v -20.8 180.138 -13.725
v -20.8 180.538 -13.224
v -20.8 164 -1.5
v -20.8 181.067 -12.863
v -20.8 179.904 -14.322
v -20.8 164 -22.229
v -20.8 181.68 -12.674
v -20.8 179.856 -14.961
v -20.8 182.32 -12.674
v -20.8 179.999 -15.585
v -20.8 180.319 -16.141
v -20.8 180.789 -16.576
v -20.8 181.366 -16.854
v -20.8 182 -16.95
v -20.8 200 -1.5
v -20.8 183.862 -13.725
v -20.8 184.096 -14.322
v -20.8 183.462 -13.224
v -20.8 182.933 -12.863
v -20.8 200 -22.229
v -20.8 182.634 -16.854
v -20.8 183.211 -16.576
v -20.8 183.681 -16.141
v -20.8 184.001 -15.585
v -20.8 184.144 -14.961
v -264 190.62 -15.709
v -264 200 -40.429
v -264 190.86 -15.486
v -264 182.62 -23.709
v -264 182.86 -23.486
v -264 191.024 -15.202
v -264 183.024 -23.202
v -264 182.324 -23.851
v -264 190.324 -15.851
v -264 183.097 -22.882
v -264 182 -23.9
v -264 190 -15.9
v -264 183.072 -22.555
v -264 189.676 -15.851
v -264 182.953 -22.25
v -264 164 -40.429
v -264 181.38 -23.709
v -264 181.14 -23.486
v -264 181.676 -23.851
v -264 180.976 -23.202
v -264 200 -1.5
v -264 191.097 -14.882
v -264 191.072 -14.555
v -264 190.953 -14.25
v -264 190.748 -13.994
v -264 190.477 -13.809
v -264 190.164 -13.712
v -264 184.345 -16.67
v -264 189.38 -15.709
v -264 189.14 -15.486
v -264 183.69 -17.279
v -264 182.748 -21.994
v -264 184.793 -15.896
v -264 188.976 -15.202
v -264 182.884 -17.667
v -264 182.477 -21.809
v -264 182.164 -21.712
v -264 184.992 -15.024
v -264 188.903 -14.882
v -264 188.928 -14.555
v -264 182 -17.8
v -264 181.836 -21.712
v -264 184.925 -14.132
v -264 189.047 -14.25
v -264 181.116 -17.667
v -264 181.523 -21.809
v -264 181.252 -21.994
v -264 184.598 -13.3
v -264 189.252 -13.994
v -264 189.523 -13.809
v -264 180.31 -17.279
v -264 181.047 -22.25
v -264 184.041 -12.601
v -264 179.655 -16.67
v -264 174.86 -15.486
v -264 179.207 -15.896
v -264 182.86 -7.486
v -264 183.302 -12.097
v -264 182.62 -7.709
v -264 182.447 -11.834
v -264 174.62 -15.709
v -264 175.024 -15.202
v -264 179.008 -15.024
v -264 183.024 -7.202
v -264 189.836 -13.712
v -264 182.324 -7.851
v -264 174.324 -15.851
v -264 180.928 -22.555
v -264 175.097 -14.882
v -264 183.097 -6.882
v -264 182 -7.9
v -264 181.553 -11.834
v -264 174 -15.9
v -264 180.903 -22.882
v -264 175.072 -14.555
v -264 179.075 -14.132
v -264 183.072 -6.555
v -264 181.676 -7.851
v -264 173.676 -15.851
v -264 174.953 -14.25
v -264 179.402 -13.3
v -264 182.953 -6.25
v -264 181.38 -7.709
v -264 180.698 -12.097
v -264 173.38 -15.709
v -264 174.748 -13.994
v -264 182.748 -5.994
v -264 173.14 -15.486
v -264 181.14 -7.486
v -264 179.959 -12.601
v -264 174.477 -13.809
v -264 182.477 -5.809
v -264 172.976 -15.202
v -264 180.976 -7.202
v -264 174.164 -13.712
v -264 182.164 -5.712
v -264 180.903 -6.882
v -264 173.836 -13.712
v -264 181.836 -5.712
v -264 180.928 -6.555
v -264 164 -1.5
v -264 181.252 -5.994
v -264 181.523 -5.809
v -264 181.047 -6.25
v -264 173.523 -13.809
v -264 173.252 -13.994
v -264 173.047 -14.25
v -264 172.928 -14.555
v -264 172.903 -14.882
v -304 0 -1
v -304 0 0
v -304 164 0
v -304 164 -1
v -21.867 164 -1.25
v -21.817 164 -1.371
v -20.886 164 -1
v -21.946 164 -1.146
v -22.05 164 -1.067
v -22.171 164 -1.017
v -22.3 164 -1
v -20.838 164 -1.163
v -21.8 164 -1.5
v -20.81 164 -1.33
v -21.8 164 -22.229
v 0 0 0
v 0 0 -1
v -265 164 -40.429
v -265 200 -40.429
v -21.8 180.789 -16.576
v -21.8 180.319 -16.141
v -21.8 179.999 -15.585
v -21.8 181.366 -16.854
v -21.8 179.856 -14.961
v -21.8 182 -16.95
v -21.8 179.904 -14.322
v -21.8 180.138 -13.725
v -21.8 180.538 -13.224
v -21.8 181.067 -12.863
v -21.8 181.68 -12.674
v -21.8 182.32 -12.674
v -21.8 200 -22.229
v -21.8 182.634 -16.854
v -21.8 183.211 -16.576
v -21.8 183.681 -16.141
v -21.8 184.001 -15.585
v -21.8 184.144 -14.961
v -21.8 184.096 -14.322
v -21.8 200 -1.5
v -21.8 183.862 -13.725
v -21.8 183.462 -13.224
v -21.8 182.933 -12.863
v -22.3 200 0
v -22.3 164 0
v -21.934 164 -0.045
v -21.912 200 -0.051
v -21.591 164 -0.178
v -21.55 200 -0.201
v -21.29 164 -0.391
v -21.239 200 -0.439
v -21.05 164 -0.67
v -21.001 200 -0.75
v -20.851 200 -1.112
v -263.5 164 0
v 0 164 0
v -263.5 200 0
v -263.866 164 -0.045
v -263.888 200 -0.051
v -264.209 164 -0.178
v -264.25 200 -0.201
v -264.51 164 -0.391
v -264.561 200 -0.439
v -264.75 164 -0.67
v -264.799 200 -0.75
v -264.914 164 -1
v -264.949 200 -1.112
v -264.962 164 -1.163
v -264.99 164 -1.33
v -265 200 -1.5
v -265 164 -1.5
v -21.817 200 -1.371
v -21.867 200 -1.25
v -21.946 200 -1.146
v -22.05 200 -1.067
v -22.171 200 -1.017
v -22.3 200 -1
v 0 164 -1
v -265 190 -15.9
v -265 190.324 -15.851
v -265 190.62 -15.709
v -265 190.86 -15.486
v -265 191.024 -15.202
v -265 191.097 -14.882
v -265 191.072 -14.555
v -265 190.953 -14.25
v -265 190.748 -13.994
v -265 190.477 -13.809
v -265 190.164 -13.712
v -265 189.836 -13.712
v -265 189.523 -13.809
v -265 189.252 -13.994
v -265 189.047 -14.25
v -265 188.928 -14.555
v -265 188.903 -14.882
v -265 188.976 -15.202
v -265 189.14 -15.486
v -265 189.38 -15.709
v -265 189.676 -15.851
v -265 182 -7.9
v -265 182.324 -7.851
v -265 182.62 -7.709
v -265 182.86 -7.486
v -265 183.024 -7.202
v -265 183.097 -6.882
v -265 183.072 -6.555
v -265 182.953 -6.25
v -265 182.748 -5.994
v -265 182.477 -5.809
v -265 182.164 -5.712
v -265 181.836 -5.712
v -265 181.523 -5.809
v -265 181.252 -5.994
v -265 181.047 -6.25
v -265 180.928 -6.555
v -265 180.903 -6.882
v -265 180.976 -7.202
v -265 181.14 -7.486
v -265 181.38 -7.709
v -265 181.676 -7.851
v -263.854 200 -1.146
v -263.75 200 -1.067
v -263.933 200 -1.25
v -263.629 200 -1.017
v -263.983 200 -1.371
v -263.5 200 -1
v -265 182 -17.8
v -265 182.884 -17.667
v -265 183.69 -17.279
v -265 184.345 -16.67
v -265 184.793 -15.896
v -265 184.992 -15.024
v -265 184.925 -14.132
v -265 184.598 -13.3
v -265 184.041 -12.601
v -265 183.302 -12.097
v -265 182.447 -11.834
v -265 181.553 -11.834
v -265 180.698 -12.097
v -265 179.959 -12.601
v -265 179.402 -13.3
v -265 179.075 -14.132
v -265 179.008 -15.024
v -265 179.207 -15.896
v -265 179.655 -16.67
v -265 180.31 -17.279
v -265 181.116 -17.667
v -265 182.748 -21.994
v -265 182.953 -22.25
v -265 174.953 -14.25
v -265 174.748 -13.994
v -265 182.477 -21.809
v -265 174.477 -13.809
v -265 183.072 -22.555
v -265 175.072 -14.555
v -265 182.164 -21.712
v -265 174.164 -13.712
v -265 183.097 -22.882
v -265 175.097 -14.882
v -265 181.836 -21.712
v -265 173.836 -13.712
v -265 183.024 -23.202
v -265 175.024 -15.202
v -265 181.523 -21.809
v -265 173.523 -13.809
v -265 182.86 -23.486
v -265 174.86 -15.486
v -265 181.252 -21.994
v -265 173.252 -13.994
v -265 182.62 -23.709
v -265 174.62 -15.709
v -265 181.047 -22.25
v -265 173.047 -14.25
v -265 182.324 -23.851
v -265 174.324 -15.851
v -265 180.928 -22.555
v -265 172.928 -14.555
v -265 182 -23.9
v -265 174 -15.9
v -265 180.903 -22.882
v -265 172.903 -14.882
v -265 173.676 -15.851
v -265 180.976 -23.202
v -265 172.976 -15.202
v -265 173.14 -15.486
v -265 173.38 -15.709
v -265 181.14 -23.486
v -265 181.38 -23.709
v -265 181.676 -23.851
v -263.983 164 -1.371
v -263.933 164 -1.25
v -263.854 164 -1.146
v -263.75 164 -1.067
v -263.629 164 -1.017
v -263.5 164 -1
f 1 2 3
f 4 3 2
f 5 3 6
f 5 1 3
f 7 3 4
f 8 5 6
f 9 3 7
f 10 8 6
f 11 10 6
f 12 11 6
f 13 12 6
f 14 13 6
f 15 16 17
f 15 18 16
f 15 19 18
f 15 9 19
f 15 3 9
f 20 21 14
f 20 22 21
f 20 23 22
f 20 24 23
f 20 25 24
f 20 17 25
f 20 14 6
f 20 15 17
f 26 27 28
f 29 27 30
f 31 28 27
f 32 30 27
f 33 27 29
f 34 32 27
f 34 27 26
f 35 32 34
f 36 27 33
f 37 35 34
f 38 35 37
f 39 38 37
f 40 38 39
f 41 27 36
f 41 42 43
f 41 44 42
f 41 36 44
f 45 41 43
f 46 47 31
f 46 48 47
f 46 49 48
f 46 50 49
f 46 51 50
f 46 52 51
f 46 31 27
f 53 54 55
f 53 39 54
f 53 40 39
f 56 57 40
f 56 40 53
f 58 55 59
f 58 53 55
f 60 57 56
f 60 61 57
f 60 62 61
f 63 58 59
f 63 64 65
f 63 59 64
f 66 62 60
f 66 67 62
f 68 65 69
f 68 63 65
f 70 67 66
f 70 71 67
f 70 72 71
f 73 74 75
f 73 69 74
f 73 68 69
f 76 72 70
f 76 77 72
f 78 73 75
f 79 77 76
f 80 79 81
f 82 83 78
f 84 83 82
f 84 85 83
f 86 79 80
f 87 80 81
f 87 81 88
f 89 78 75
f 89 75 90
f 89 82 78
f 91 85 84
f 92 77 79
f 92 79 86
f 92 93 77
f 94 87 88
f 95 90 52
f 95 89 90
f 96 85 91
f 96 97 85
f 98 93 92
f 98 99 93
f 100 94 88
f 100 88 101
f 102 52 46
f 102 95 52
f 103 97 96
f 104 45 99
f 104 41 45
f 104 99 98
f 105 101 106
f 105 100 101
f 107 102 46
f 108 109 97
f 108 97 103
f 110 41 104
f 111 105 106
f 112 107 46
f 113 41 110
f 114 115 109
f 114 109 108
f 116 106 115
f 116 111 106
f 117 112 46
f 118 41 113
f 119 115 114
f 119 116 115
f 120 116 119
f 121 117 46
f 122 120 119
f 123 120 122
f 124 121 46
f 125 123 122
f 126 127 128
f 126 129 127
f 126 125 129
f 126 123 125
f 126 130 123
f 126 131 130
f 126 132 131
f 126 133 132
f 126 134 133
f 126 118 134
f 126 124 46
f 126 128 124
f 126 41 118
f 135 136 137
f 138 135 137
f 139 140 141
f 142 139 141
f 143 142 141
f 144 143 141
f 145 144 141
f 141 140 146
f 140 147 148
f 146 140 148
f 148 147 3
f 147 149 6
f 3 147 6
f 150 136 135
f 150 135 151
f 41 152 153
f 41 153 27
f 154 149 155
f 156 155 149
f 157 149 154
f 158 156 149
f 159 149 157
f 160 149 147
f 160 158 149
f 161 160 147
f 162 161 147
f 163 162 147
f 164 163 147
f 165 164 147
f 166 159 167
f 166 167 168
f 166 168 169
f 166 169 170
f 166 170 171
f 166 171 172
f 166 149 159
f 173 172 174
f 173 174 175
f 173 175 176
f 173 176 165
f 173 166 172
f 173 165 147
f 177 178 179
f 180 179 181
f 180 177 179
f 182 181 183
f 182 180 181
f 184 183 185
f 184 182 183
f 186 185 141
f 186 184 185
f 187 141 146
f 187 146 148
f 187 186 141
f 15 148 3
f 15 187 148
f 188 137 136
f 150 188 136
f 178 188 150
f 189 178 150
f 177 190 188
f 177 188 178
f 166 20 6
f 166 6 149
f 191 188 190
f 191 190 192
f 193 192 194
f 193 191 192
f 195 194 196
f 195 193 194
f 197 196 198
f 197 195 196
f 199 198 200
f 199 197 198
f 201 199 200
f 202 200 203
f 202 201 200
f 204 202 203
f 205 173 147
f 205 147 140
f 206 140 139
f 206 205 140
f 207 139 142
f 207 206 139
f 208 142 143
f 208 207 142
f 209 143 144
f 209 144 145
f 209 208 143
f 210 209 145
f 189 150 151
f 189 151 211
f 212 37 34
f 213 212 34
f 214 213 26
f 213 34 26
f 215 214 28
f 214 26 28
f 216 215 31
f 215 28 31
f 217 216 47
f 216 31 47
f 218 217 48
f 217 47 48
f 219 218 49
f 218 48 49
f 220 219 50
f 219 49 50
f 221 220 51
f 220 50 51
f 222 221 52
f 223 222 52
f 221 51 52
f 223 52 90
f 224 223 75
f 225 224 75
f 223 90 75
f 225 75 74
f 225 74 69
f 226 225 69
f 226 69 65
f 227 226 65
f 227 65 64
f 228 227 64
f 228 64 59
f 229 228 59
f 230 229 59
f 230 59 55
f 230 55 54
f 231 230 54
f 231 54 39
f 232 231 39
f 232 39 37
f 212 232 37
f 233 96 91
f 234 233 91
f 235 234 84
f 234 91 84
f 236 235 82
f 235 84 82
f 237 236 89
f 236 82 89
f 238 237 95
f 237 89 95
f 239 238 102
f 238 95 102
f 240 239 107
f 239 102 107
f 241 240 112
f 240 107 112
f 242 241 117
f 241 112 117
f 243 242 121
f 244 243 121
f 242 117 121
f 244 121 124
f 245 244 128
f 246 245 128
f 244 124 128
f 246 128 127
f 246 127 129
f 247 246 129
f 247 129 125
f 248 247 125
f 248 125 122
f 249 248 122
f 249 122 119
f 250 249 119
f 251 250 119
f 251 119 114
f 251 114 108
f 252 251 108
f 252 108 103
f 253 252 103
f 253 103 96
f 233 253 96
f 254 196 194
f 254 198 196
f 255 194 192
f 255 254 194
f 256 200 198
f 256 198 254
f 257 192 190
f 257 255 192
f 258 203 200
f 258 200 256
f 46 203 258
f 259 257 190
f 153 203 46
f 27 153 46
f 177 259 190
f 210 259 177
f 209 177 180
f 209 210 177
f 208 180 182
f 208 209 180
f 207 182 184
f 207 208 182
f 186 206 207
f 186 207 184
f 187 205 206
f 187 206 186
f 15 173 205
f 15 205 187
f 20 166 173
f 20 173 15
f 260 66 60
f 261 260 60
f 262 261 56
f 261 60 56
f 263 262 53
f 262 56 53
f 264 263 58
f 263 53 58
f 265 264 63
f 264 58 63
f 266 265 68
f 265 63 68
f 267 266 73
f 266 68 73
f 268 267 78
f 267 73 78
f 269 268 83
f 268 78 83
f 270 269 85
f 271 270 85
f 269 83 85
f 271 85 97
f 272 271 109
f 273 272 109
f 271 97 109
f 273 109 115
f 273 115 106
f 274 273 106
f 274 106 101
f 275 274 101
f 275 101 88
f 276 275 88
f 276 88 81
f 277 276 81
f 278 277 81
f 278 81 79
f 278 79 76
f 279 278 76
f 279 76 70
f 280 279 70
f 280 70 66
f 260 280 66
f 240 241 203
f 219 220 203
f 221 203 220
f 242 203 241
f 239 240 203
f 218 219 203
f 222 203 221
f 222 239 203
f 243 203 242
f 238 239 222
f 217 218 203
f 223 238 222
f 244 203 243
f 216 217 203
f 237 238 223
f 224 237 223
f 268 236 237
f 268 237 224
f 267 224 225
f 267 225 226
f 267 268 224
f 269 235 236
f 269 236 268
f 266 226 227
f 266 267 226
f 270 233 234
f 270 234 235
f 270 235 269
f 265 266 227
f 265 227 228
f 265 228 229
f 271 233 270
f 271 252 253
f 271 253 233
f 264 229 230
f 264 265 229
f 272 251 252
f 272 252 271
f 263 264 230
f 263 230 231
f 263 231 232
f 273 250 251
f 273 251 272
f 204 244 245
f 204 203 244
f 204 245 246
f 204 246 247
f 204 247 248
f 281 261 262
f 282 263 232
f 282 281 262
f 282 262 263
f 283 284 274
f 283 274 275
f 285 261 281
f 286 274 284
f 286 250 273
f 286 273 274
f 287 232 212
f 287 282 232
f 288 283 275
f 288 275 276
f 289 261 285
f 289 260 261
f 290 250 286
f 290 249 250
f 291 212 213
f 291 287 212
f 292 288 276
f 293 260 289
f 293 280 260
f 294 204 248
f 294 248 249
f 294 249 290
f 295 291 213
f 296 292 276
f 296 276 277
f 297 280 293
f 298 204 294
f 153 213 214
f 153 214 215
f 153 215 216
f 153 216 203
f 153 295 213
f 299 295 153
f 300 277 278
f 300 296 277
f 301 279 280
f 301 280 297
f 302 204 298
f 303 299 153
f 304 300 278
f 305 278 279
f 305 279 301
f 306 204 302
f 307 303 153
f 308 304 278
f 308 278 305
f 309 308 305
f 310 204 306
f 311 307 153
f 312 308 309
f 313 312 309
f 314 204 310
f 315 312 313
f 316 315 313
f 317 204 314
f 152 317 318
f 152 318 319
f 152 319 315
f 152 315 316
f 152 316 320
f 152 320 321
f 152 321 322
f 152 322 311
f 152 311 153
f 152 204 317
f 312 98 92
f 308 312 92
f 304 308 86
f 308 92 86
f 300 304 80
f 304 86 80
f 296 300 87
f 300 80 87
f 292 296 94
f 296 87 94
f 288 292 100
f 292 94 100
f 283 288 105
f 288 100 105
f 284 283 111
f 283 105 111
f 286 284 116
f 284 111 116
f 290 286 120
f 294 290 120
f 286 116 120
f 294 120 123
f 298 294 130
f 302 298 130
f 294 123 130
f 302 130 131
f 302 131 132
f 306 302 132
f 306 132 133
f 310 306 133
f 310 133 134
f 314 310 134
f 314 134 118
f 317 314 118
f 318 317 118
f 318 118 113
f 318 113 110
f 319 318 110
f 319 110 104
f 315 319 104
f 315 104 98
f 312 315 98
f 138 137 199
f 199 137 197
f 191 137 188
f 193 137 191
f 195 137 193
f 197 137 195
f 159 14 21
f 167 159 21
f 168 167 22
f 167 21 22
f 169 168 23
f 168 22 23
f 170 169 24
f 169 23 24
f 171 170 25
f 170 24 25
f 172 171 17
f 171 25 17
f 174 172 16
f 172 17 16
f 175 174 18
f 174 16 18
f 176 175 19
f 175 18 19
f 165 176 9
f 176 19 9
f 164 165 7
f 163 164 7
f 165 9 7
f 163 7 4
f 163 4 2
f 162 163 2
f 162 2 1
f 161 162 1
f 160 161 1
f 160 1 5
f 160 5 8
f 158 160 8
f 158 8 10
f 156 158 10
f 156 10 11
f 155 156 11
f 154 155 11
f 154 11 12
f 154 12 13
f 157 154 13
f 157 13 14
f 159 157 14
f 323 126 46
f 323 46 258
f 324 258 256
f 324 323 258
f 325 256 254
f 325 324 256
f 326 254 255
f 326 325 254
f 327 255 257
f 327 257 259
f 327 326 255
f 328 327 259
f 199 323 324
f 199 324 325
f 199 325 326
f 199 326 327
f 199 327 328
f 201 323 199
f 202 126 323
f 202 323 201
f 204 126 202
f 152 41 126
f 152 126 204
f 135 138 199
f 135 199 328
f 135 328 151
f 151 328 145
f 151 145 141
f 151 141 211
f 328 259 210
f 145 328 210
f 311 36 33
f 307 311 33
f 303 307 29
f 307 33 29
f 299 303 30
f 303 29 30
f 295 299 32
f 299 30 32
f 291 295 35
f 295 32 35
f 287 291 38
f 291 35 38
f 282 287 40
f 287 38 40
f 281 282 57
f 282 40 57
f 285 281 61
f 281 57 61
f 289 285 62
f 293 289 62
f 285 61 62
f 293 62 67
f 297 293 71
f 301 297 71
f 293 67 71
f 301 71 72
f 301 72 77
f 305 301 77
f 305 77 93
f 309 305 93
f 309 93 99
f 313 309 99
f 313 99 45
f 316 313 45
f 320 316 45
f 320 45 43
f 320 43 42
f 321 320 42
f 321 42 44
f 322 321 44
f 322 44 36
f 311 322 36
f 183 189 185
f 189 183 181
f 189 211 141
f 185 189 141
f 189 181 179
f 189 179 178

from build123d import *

# Parameters (mm, degrees)
SKETCH1_W                    = 304
SKETCH1_H                    = 200
BASE_FLANGE1_DEPTH           = 1
SKETCH2_W                    = 39
SKETCH2_H                    = 36
CUT_EXTRUDE1_DEPTH           = 10
EDGE_FLANGE1_STRIP_W         = 5
EDGE_FLANGE1_STRIP_H         = 1
EDGE_FLANGE1_STRIP_CUT_DEPTH = 36
EDGE_FLANGE1_DEPTH           = 36
SKETCH9_R                    = 1.1
SKETCH9_R_2                  = 3
CUT_EXTRUDE2_DEPTH           = 10
CUT_EXTRUDE4_REACH           = 368.129
SKETCH18_W                   = 20.8
SKETCH18_H                   = 36
EDGE_FLANGE2_STRIP_W         = 5
EDGE_FLANGE2_STRIP_H         = 1
EDGE_FLANGE2_STRIP_CUT_DEPTH = 36
EDGE_FLANGE2_DEPTH           = 36
M4_CLEARANCE_HOLE2_D         = 4.3


# Sheet-metal steps are written as plain solids
with BuildPart() as part:
    # Sketch1 → Base-Flange1 (new body)
    with BuildSketch(Plane.XY):
        with Locations((-152, 100)):
            Rectangle(SKETCH1_W, SKETCH1_H)
    extrude(amount=-BASE_FLANGE1_DEPTH)

    # Sketch2 → Cut-Extrude1 (cut)
    with BuildSketch(Plane.XY):
        with Locations((-284.5, 182)):
            Rectangle(SKETCH2_W, SKETCH2_H)
    extrude(amount=-CUT_EXTRUDE1_DEPTH, mode=Mode.SUBTRACT)

    # Edge-Flange1 strip (across the edge) → Edge-Flange1 strip cut (cut)
    with BuildSketch(Plane(origin=(-265, 164, -1), x_dir=(1, 0, 0), z_dir=(0, 1, 0))):
        with Locations((-1, -0.5)):
            Rectangle(EDGE_FLANGE1_STRIP_W, EDGE_FLANGE1_STRIP_H)
    extrude(amount=EDGE_FLANGE1_STRIP_CUT_DEPTH, mode=Mode.SUBTRACT)

    # Edge-Flange1 section (across the edge) → Edge-Flange1 (add)
    with BuildSketch(Plane(origin=(-265, 164, -1), x_dir=(1, 0, 0), z_dir=(0, 1, 0))):
        with BuildLine():
            Line((0, 0.5), (0, 39.429))
            Line((0, 39.429), (1, 39.429))
            Line((1, 39.429), (1, 0.5))
            ThreePointArc((1, 0.5), (1.146446609, 0.146446609), (1.5, 0))
            Line((1.5, 0), (1.5, -1))
            ThreePointArc((1.5, -1), (0.439339828, -0.560660172), (0, 0.5))
        make_face()
    extrude(amount=EDGE_FLANGE1_DEPTH)

    # Sketch9 → Cut-Extrude2 (cut)
    with BuildSketch(Plane(origin=(-264, 0, 0), x_dir=(0, 0, -1), z_dir=(1, 0, 0))):
        with Locations((22.8, 182)):
            Circle(SKETCH9_R)
        with Locations((14.8, 190)):
            Circle(SKETCH9_R)
        with Locations((14.8, 174)):
            Circle(SKETCH9_R)
        with Locations((6.8, 182)):
            Circle(SKETCH9_R)
        with Locations((14.8, 182)):
            Circle(SKETCH9_R_2)
    extrude(amount=-CUT_EXTRUDE2_DEPTH, mode=Mode.SUBTRACT)

    # Sketch18 → Cut-Extrude4 (cut, up to next)
    with BuildSketch(Plane.XY, mode=Mode.PRIVATE) as cut_extrude4_sk1:
        with Locations((-10.4, 182)):
            Rectangle(SKETCH18_W, SKETCH18_H)
    cut_extrude4_tool1 = extrude(cut_extrude4_sk1.sketch, amount=-CUT_EXTRUDE4_REACH, mode=Mode.PRIVATE) & part.part
    add(cut_extrude4_tool1.solids().sort_by_distance((-10.4, 182, 0))[0], mode=Mode.SUBTRACT)

    # Edge-Flange2 strip (across the edge) → Edge-Flange2 strip cut (cut)
    with BuildSketch(Plane(origin=(-20.8, 200, -1), x_dir=(-1, 0, 0), z_dir=(0, -1, 0))):
        with Locations((-1, -0.5)):
            Rectangle(EDGE_FLANGE2_STRIP_W, EDGE_FLANGE2_STRIP_H)
    extrude(amount=EDGE_FLANGE2_STRIP_CUT_DEPTH, mode=Mode.SUBTRACT)

    # Edge-Flange2 section (across the edge) → Edge-Flange2 (add)
    with BuildSketch(Plane(origin=(-20.8, 200, -1), x_dir=(-1, 0, 0), z_dir=(0, -1, 0))):
        with BuildLine():
            Line((0, 0.5), (0, 21.2292))
            Line((0, 21.2292), (1, 21.2292))
            Line((1, 21.2292), (1, 0.5))
            ThreePointArc((1, 0.5), (1.146446609, 0.146446609), (1.5, 0))
            Line((1.5, 0), (1.5, -1))
            ThreePointArc((1.5, -1), (0.439339828, -0.560660172), (0, 0.5))
        make_face()
    extrude(amount=EDGE_FLANGE2_DEPTH)

    # M4 Clearance Hole2 (through all)
    with Locations(Plane.ZY.offset(21.8)):
        with Locations((-14.8, 182)):
            Hole(M4_CLEARANCE_HOLE2_D / 2)


solid = part.part
